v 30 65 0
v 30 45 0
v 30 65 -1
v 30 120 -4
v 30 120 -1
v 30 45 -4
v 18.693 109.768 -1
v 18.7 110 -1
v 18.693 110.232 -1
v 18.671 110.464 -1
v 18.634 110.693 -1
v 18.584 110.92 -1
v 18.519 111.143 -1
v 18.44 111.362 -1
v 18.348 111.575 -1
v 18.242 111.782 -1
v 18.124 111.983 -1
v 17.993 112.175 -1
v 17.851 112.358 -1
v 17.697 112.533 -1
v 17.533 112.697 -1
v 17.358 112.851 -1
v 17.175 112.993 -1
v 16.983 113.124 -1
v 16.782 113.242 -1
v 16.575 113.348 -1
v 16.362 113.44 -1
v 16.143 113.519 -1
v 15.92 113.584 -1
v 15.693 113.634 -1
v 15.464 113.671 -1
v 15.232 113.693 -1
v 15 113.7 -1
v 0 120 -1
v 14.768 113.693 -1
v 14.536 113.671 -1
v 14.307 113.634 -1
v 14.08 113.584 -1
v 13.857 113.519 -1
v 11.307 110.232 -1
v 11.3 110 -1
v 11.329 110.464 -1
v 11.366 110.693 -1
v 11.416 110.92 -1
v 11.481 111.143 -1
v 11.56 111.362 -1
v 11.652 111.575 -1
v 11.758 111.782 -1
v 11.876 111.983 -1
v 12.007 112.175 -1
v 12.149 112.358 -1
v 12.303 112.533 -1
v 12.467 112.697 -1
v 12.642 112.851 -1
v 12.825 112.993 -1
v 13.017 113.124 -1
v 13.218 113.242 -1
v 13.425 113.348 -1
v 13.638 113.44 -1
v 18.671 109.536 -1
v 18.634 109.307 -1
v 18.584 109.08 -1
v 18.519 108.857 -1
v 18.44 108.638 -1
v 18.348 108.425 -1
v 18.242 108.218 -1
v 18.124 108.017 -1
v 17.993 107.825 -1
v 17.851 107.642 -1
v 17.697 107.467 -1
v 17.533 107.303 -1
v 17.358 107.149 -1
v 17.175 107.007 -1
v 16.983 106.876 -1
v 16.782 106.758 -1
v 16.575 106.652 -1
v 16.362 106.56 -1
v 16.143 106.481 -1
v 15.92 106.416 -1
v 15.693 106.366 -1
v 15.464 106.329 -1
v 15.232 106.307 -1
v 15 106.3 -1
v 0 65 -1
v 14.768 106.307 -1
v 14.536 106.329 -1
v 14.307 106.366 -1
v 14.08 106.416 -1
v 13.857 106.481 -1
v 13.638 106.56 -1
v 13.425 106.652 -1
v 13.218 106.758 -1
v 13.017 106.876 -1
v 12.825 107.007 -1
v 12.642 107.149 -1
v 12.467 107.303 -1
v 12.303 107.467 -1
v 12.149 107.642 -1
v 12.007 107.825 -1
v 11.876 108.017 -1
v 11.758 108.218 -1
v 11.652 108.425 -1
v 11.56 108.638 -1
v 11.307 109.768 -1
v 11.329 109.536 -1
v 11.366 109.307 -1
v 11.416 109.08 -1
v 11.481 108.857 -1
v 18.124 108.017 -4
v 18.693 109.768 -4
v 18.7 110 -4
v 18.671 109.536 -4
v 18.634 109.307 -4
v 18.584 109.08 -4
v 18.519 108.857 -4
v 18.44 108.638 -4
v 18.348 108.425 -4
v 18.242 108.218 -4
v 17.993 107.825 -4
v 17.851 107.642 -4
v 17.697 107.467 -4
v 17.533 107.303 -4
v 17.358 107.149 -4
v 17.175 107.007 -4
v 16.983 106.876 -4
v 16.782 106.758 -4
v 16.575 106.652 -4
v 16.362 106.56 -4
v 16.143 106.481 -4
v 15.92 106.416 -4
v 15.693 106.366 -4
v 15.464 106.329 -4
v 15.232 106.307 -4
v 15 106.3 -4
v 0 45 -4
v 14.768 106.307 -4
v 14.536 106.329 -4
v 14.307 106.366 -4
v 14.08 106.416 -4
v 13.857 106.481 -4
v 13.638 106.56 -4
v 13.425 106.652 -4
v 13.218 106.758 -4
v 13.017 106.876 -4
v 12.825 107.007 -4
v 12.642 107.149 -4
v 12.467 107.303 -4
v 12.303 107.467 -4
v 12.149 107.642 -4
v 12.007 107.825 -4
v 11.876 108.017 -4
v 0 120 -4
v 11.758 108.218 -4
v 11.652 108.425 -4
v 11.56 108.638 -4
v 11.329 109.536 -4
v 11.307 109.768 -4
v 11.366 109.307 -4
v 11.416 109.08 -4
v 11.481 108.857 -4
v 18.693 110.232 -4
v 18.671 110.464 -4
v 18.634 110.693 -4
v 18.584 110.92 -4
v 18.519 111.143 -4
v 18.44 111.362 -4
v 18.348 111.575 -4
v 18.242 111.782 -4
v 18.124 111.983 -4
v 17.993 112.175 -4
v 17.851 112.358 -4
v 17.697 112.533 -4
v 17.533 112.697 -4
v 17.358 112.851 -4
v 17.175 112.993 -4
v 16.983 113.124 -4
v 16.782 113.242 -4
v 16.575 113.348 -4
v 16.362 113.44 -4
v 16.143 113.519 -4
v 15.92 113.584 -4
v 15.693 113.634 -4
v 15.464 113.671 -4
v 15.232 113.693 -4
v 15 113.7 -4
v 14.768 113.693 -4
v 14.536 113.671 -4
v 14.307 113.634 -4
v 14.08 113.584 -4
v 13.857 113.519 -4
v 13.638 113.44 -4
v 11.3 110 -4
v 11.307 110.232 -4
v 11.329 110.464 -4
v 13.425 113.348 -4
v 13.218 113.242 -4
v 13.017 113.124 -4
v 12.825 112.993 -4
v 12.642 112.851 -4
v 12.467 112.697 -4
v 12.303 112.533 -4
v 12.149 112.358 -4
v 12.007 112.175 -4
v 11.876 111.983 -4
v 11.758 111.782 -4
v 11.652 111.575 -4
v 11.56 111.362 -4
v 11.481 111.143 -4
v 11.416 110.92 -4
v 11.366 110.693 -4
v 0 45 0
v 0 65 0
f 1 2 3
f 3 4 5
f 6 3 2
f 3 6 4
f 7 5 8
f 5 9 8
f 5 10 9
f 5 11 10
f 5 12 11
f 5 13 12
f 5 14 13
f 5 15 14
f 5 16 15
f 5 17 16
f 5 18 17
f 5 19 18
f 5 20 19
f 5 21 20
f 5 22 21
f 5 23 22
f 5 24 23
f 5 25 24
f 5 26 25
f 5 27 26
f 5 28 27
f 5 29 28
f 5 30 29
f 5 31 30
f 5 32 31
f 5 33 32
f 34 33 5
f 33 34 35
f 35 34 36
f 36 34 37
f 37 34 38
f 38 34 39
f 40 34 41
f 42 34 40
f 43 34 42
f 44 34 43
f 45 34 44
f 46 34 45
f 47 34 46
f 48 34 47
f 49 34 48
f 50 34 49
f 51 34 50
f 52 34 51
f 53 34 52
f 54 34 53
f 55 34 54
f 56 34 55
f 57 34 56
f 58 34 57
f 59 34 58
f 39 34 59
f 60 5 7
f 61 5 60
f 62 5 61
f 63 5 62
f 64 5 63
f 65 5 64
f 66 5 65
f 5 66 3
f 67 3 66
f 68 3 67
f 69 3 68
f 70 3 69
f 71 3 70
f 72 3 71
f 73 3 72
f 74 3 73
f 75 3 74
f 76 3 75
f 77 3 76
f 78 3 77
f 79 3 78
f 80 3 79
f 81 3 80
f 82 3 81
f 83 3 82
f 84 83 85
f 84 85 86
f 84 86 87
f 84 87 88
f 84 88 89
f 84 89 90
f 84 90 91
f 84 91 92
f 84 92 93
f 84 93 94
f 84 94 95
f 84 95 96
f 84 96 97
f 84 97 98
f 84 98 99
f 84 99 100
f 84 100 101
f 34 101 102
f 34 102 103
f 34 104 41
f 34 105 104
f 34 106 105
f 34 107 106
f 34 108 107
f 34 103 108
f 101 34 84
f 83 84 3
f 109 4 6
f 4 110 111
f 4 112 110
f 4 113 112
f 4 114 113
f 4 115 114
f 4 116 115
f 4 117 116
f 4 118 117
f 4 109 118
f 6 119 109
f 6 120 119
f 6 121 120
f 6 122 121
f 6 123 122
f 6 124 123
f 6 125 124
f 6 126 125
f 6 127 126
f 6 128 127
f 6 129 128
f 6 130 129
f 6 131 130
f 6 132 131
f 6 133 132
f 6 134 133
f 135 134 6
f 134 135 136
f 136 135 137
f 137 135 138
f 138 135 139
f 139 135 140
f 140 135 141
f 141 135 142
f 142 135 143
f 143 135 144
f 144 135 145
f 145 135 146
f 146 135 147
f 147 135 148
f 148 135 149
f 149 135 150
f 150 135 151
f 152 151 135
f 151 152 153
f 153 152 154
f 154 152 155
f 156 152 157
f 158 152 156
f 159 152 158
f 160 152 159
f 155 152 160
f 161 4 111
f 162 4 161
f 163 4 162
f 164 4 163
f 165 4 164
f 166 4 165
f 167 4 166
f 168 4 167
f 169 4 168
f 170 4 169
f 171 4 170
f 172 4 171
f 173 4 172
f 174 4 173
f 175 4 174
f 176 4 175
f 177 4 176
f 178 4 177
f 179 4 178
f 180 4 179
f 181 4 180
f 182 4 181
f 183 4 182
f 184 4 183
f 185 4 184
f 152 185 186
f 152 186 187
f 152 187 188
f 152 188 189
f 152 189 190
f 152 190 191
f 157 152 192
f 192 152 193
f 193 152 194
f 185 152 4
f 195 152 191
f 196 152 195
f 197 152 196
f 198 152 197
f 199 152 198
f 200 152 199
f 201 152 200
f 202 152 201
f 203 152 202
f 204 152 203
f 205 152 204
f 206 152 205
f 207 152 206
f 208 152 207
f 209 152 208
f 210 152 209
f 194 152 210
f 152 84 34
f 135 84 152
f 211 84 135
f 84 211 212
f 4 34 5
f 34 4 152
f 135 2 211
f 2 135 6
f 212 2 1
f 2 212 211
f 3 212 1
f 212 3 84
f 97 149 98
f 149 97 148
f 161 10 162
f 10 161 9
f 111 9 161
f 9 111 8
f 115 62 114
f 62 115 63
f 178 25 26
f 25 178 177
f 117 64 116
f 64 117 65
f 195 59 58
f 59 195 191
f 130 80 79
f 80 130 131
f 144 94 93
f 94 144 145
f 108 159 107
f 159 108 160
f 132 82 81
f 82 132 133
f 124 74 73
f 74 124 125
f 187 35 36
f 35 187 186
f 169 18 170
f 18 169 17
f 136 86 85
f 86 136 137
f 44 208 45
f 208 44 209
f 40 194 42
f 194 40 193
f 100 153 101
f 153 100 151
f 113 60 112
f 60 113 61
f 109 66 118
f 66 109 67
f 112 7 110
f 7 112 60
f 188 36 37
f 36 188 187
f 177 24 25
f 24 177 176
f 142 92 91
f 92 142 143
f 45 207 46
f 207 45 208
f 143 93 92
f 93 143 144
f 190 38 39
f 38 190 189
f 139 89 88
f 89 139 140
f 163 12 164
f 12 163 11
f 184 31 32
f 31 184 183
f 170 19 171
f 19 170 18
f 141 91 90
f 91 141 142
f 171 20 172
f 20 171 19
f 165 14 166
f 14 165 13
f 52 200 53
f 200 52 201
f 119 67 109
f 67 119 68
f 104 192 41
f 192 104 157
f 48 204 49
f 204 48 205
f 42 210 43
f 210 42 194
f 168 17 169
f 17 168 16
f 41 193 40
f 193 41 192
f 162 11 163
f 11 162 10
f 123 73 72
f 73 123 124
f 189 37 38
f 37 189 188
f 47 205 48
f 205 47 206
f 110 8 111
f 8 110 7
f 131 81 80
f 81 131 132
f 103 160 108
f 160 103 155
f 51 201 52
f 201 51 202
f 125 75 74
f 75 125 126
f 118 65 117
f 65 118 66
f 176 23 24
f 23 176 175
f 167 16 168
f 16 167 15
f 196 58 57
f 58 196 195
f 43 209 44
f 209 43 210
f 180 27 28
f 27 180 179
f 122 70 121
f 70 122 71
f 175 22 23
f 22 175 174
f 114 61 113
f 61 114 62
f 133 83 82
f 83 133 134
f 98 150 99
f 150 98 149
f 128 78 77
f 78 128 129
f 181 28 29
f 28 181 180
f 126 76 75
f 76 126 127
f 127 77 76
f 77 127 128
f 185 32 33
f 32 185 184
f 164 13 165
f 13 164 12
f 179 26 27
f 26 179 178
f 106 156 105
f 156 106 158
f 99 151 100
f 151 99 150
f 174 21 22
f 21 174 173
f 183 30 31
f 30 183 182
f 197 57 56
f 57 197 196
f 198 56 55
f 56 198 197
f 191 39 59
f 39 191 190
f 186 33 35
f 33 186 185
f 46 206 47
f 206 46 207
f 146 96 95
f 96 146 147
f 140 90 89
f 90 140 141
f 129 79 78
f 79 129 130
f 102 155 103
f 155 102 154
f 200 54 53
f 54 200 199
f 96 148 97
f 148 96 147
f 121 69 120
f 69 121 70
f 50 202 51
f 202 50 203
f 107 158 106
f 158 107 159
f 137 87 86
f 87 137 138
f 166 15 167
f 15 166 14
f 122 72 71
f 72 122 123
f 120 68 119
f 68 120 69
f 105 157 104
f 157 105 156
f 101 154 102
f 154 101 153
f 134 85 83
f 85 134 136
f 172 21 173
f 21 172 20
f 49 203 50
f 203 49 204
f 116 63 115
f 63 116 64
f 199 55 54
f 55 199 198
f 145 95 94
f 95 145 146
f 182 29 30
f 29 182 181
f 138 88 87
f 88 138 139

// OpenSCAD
difference(){
	union(){
       
        translate([0,45,-4]){
           cube([30,75,3], center=false);
        }
        // deel 2 -1
        translate([0,45,-4]){
           cube([30,20,4], center=false);
        }
	}
	union() {

        // deel 2
        translate([15,110,-10]){
            rotate(a = [0,0,0]) {
                cylinder(h=20, r=3.7, $fn=100, center=false);
            }
        }	


        
	}
}
